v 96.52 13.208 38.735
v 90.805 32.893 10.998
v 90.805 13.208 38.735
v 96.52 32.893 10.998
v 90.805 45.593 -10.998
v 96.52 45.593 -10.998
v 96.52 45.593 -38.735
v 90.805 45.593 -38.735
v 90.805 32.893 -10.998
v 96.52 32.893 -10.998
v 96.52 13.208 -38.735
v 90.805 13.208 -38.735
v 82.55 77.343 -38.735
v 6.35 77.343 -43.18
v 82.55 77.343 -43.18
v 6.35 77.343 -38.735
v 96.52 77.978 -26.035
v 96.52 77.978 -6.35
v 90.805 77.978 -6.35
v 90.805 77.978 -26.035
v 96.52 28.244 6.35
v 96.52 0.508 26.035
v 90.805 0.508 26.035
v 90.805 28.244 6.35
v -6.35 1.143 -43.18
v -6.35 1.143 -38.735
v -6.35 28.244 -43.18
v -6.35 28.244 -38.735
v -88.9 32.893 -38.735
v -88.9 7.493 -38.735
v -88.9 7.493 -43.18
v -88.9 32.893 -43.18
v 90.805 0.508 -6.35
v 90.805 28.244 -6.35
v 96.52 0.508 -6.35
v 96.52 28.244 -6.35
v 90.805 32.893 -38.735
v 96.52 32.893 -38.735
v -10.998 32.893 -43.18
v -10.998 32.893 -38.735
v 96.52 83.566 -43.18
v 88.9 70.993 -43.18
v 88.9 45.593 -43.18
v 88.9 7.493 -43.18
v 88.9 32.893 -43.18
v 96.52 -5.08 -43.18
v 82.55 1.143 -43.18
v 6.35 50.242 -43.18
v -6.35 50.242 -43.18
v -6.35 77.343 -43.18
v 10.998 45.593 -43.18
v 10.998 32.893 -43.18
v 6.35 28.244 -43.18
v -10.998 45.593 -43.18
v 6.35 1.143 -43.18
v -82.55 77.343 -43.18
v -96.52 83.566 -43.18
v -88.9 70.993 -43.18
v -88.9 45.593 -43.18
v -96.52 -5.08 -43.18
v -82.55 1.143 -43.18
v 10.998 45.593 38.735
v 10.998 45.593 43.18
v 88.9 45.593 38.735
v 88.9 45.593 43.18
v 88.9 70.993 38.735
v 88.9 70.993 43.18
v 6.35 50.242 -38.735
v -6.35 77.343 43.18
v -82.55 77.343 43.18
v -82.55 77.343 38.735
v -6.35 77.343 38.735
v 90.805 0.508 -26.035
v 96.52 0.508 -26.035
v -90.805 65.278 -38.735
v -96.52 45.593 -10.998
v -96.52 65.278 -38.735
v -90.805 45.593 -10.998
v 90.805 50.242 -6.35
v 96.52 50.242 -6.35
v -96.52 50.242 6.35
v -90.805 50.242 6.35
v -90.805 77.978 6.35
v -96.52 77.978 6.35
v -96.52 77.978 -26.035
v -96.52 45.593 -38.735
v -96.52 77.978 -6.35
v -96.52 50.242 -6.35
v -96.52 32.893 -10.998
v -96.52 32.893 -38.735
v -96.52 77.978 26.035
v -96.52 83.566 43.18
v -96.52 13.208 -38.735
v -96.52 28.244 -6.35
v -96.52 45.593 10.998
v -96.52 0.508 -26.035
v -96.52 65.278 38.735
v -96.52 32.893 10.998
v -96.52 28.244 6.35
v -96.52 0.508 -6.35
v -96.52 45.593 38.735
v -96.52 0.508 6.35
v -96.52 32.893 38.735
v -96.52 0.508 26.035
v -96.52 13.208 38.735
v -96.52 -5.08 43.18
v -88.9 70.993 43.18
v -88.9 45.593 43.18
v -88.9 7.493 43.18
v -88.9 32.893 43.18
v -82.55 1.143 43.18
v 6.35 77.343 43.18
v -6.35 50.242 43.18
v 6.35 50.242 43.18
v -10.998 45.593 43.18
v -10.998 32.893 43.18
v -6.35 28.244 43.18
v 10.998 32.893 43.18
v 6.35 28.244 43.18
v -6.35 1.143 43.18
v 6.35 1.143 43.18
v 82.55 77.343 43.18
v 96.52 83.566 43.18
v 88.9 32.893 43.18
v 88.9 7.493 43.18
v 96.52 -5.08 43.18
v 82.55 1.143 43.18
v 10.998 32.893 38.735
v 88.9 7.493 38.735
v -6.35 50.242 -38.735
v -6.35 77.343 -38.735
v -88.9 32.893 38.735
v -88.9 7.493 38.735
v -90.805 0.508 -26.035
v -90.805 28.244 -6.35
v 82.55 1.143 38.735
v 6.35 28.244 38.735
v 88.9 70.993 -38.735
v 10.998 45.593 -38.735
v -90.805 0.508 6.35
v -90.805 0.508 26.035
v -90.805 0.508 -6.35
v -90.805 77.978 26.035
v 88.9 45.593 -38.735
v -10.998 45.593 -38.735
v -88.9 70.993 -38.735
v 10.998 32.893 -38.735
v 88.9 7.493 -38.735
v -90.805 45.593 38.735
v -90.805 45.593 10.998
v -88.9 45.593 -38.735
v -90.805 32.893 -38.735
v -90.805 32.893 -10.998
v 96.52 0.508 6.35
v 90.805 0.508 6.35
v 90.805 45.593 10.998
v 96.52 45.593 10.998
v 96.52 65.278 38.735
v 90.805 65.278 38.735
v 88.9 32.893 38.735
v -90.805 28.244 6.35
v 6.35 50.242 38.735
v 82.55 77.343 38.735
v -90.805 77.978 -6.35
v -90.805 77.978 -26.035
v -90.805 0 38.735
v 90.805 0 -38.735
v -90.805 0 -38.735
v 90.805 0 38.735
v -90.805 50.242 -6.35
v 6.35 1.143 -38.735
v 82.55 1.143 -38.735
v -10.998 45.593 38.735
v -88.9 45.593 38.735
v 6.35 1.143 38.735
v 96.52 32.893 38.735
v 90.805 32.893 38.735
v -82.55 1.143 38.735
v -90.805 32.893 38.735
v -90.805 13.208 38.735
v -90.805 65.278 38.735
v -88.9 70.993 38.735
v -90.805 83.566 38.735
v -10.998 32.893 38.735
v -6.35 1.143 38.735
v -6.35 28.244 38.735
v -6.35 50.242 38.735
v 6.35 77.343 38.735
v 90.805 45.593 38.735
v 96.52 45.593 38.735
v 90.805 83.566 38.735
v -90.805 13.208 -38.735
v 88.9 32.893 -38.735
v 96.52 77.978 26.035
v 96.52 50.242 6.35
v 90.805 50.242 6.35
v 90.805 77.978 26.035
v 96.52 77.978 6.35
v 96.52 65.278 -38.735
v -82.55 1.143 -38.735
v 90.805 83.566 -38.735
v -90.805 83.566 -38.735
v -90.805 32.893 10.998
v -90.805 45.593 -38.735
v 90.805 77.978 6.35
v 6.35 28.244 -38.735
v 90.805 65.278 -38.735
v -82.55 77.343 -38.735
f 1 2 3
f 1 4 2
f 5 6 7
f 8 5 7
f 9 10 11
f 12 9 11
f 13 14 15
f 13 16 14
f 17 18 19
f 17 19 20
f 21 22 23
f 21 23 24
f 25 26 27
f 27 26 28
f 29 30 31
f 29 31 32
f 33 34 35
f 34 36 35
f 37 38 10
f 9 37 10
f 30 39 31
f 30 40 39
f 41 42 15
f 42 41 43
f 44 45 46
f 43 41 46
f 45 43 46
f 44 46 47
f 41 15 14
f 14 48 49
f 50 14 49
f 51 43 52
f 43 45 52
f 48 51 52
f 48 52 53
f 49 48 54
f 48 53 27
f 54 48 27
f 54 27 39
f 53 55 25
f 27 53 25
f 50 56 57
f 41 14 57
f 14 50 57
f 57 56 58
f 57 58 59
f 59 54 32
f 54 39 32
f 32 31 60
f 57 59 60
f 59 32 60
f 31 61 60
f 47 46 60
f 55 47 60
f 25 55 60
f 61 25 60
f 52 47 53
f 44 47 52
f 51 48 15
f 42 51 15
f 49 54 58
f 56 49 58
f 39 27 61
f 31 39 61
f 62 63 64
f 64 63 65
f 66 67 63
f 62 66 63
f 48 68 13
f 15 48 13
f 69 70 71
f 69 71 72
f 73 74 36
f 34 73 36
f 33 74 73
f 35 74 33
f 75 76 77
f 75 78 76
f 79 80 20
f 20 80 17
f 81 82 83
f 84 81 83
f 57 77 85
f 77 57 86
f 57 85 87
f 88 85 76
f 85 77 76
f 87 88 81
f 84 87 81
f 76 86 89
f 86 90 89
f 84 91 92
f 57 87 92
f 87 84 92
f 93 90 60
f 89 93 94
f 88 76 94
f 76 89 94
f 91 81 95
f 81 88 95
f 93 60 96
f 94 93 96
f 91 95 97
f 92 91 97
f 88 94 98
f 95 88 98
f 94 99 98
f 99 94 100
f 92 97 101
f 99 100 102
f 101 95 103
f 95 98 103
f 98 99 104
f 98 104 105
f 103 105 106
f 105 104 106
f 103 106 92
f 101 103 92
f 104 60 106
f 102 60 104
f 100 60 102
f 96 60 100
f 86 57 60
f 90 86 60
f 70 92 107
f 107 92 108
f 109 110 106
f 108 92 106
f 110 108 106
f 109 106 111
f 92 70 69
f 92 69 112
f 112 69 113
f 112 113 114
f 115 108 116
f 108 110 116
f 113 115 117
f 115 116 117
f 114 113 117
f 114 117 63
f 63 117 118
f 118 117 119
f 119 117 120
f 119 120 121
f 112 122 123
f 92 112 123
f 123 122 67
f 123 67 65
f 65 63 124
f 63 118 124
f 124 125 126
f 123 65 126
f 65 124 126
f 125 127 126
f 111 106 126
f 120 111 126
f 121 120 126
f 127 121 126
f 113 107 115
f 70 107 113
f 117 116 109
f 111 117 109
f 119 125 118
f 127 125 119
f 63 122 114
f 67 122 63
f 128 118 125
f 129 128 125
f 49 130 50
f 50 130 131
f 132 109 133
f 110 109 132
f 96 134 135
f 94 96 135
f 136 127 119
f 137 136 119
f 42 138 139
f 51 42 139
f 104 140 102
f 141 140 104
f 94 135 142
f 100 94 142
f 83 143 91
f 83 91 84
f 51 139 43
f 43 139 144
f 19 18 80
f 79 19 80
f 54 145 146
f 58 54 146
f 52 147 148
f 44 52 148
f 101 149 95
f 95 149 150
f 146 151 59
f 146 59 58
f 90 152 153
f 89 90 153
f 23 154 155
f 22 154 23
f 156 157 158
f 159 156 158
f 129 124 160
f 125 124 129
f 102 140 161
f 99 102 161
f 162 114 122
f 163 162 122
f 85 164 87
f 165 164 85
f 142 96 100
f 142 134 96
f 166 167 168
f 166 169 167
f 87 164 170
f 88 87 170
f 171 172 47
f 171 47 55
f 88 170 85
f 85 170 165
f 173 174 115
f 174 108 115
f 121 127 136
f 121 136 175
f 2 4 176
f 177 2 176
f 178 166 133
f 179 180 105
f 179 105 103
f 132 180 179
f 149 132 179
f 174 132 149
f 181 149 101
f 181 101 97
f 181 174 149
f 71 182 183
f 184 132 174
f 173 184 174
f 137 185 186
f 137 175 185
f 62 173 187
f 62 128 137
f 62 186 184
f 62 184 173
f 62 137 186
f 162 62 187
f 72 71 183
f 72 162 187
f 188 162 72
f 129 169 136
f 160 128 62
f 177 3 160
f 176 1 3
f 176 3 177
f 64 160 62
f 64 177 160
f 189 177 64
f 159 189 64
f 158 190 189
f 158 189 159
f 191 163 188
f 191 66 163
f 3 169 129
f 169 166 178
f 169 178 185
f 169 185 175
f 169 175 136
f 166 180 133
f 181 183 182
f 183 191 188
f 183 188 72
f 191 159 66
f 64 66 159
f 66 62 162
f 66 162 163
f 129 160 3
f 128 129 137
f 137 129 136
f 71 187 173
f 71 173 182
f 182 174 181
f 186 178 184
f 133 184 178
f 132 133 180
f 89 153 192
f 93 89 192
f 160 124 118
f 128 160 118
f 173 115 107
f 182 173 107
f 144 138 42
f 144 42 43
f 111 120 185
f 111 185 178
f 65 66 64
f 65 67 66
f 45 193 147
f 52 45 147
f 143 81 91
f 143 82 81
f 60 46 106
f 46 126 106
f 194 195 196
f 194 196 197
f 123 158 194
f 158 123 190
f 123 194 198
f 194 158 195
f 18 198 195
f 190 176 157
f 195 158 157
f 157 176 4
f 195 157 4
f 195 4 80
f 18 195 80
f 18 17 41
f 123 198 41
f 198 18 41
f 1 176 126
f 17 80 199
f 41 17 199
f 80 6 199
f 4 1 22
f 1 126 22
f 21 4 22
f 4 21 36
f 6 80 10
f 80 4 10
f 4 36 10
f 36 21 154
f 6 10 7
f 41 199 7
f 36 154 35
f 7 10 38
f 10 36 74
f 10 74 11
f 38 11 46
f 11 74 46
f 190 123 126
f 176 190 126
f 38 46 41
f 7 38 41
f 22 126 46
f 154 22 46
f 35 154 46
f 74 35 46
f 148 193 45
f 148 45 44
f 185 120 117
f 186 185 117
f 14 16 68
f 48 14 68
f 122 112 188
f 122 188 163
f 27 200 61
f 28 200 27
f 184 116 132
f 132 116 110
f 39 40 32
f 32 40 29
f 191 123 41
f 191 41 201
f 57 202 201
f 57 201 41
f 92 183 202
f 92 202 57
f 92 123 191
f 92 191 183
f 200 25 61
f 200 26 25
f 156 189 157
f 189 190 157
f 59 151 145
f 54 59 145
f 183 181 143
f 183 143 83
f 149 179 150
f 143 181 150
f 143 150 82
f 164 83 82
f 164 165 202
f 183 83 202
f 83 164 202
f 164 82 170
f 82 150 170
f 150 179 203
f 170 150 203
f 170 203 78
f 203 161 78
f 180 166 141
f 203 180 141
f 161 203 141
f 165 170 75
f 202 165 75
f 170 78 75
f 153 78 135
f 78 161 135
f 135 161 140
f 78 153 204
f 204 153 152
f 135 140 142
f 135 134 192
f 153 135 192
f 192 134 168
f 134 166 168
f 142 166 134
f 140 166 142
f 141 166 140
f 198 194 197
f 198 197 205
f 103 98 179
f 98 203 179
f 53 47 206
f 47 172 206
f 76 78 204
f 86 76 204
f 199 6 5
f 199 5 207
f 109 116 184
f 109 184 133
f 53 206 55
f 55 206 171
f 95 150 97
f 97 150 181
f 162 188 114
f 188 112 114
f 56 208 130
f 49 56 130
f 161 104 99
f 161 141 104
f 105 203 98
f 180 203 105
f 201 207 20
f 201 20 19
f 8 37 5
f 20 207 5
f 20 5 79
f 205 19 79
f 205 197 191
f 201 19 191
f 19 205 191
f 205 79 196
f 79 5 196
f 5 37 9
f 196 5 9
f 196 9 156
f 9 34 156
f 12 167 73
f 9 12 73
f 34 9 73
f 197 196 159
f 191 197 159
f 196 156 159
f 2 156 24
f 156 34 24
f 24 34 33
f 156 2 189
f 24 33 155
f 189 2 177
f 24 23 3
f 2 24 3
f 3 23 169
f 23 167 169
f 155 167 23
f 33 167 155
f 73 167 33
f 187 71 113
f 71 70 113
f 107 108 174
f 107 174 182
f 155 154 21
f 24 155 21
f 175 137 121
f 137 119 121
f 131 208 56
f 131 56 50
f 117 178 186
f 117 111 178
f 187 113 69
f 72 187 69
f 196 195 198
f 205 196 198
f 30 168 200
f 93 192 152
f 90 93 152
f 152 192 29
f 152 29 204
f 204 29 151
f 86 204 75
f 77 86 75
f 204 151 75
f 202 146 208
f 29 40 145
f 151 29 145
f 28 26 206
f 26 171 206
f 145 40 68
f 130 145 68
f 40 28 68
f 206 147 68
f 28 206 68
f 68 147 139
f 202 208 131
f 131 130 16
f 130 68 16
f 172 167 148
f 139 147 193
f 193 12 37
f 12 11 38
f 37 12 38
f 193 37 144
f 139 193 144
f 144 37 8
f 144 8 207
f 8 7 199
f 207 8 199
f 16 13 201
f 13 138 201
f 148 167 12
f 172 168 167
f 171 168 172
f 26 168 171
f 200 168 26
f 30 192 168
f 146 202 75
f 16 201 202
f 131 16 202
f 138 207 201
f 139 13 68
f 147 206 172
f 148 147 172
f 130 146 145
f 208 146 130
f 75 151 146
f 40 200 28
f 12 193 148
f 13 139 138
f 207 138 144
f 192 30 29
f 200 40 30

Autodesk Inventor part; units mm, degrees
ref_plane "YZ Plane" through (0, 0, 0) normal (1, 0, 0) x (0, 1, 0)
ref_plane "XZ Plane" through (0, 0, 0) normal (0, 1, 0) x (-1, 0, 0)
ref_plane "XY Plane" through (0, 0, 0) normal (0, 0, 1) x (1, 0, 0)
sketch "Sketch1" plane through (0, 0, 0) normal (0, 1, 0) x (-1, 0, 0)
  line L0 (-90.805, 38.735) -> (90.805, 38.735)
  line L1 (90.805, 38.735) -> (90.805, -38.735)
  line L2 (90.805, -38.735) -> (-90.805, -38.735)
  line L3 (-90.805, -38.735) -> (-90.805, 38.735)
  line L4 (-90.805, 38.735) -> (90.805, -38.735) construction
  line L5 (90.805, 38.735) -> (-90.805, -38.735) construction
  line L6 (96.52, 43.18) -> (-96.52, 43.18)
  line L7 (-96.52, 43.18) -> (-96.52, -43.18)
  line L8 (-96.52, -43.18) -> (96.52, -43.18)
  line L9 (96.52, -43.18) -> (96.52, 43.18)
  line L10 (96.52, 43.18) -> (-96.52, -43.18) construction
  line L11 (-96.52, 43.18) -> (96.52, -43.18) construction
  point P0 (0, 0)
  dimension "d0" = 181.61
  dimension "d1" = 77.47
  dimension "d2" = 193.04
  dimension "d3" = 86.36
extrude "Extrusion1" add sketch "Sketch1" against normal blind 5.08 contours L0 L1 L2 L3 | L9 L8 L7 L6
extrude "Extrusion2" add sketch "Sketch1" along normal blind 83.566
sketch "Sketch2" plane through (-96.52, -5.08, 43.18) normal (0, 0, 1) x (1, 0, 0)
  line L0 (187.325, 88.646) -> (5.715, 88.646) projected
  line L1 (193.04, 88.646) -> (193.04, 0) projected
  line L2 (7.62, 82.423) -> (185.42, 82.423)
  line L3 (185.42, 82.423) -> (185.42, 6.223)
  line L4 (185.42, 6.223) -> (7.62, 6.223)
  line L5 (7.62, 6.223) -> (7.62, 82.423)
  line L6 (185.42, 50.673) -> (185.42, 37.973)
  line L7 (7.62, 37.973) -> (7.62, 50.673)
  line L8 (90.17, 82.423) -> (102.87, 82.423)
  line L9 (102.87, 6.223) -> (90.17, 6.223)
  line L10 (7.62, 50.673) -> (85.5215, 50.673)
  line L11 (107.5185, 50.673) -> (185.42, 50.673)
  line L12 (90.17, 6.223) -> (90.17, 33.3245)
  line L13 (90.17, 55.3215) -> (90.17, 82.423)
  line L14 (185.42, 37.973) -> (107.5185, 37.973)
  line L15 (85.5215, 37.973) -> (7.62, 37.973)
  line L16 (102.87, 82.423) -> (102.87, 55.3215)
  line L17 (102.87, 33.3245) -> (102.87, 6.223)
  arc A0 (90.17, 55.3215) -> (85.5215, 50.673) centre (96.52, 44.323) ccw
  arc A1 (107.5185, 50.673) -> (102.87, 55.3215) centre (96.52, 44.323) ccw
  arc A2 (85.5215, 37.973) -> (90.17, 33.3245) centre (96.52, 44.323) ccw
  arc A3 (102.87, 33.3245) -> (107.5185, 37.973) centre (96.52, 44.323) ccw
  line L18 (7.62, 82.423) -> (13.97, 82.423)
  line L19 (13.97, 82.423) -> (13.97, 76.073)
  line L20 (13.97, 76.073) -> (7.62, 76.073)
  line L21 (7.62, 76.073) -> (7.62, 82.423)
  line L22 (185.42, 82.423) -> (179.07, 82.423)
  line L23 (179.07, 82.423) -> (179.07, 76.073)
  line L24 (179.07, 76.073) -> (185.42, 76.073)
  line L25 (185.42, 76.073) -> (185.42, 82.423)
  line L26 (185.42, 6.223) -> (179.07, 6.223)
  line L27 (179.07, 6.223) -> (179.07, 12.573)
  line L28 (179.07, 12.573) -> (185.42, 12.573)
  line L29 (185.42, 12.573) -> (185.42, 6.223)
  line L30 (7.62, 6.223) -> (13.97, 6.223)
  line L31 (13.97, 6.223) -> (13.97, 12.573)
  line L32 (13.97, 12.573) -> (7.62, 12.573)
  line L33 (7.62, 12.573) -> (7.62, 6.223)
  line L34 (13.97, 6.223) -> (90.17, 33.3245)
  line L35 (85.5215, 37.973) -> (7.62, 12.573)
  line L36 (85.5215, 50.673) -> (7.62, 76.073)
  line L37 (13.97, 82.423) -> (90.17, 55.3215)
  line L38 (102.87, 55.3215) -> (179.07, 82.423)
  line L39 (185.42, 76.073) -> (107.5185, 50.673)
  line L40 (107.5185, 37.973) -> (185.42, 12.573)
  line L41 (179.07, 6.223) -> (102.87, 33.3245)
  point P0 (96.52, 5.08)
  point P1 (96.52, 88.646)
  point P2 (193.04, 44.323)
  point P3 (13.97, 82.423)
  point P4 (13.97, 6.223)
  dimension "d8" = 177.8
  dimension "d9" = 76.2
  dimension "d11" = 12.7
  dimension "d12" = 12.7
  dimension "d13" = 6.35
  dimension "d14" = 6.35
  dimension "d15" = 6.35
  dimension "d16" = 6.35
  dimension "d17" = 6.35
  dimension "d18" = 6.35
  dimension "d19" = 6.35
  dimension "d20" = 6.35
extrude "Extrusion3" cut sketch "Sketch2" against normal through all contours L2 L13 L37 | L36 L10 L5 | L2 L38 L16 | L15 L35 L5 | L39 L3 L11 | L12 L4 L34 | L3 L40 L14 | L17 L41 L4
sketch "Sketch3" plane through (96.52, -5.08, 43.18) normal (1, 0, 0) x (0, 0, -1)
  line L0 (81.915, 88.646) -> (4.445, 88.646) projected
  line L1 (86.36, 0) -> (86.36, 88.646) projected
  line L2 (81.915, 5.08) -> (81.915, 88.646) projected
  line L3 (4.445, 83.058) -> (81.915, 83.058)
  line L4 (81.915, 83.058) -> (81.915, 5.588)
  line L5 (81.915, 5.588) -> (4.445, 5.588)
  line L6 (4.445, 5.588) -> (4.445, 83.058)
  circle A0 centre (43.18, 44.323) radius 12.7
  line L7 (81.915, 50.673) -> (81.915, 37.973)
  line L8 (4.445, 37.973) -> (4.445, 50.673)
  line L9 (36.83, 83.058) -> (49.53, 83.058)
  line L10 (49.53, 5.588) -> (36.83, 5.588)
  line L11 (4.445, 50.673) -> (32.1815, 50.673)
  line L12 (54.1785, 50.673) -> (81.915, 50.673)
  line L13 (36.83, 5.588) -> (36.83, 33.3245)
  line L14 (36.83, 55.3215) -> (36.83, 83.058)
  line L15 (81.915, 37.973) -> (54.1785, 37.973)
  line L16 (32.1815, 37.973) -> (4.445, 37.973)
  line L17 (49.53, 83.058) -> (49.53, 55.3215)
  line L18 (49.53, 33.3245) -> (49.53, 5.588)
  line L19 (4.445, 83.058) -> (17.145, 83.058)
  line L20 (17.145, 83.058) -> (17.145, 70.358)
  line L21 (17.145, 70.358) -> (4.445, 70.358)
  line L22 (4.445, 70.358) -> (4.445, 83.058)
  line L23 (81.915, 83.058) -> (69.215, 83.058)
  line L24 (69.215, 83.058) -> (69.215, 70.358)
  line L25 (69.215, 70.358) -> (81.915, 70.358)
  line L26 (81.915, 70.358) -> (81.915, 83.058)
  line L27 (4.445, 5.588) -> (17.145, 5.588)
  line L28 (17.145, 5.588) -> (17.145, 18.288)
  line L29 (17.145, 18.288) -> (4.445, 18.288)
  line L30 (4.445, 18.288) -> (4.445, 5.588)
  line L31 (81.915, 5.588) -> (69.215, 5.588)
  line L32 (69.215, 5.588) -> (69.215, 18.288)
  line L33 (69.215, 18.288) -> (81.915, 18.288)
  line L34 (81.915, 18.288) -> (81.915, 5.588)
  line L35 (17.145, 5.588) -> (36.83, 33.3245)
  line L36 (32.1815, 37.973) -> (4.445, 18.288)
  line L37 (69.215, 5.588) -> (49.53, 33.3245)
  line L38 (54.1785, 37.973) -> (81.915, 18.288)
  line L39 (49.53, 55.3215) -> (69.215, 83.058)
  line L40 (54.1785, 50.673) -> (81.915, 70.358)
  line L41 (36.83, 55.3215) -> (17.145, 83.058)
  line L42 (32.1815, 50.673) -> (4.445, 70.358)
  point P0 (43.18, 5.08)
  point P1 (43.18, 88.646)
  point P2 (86.36, 44.323)
  dimension "d24" = 25.4
  dimension "d23" = 77.47
  dimension "d25" = 12.7
  dimension "d26" = 12.7
  dimension "d27" = 12.7
  dimension "d28" = 12.7
  dimension "d29" = 12.7
  dimension "d30" = 12.7
  dimension "d31" = 12.7
  dimension "d32" = 12.7
  dimension "d33" = 12.7
  dimension "d34" = 12.7
extrude "Extrusion4" cut sketch "Sketch3" against normal through all contours L38 L15 L2 | L5 L18 L37 | L12 L40 L2 | L5 L35 L13 | L36 L6 L16 | L17 L3 L39 | L11 L6 L42 | L41 L3 L14
properties part number "BatteryHolder"
